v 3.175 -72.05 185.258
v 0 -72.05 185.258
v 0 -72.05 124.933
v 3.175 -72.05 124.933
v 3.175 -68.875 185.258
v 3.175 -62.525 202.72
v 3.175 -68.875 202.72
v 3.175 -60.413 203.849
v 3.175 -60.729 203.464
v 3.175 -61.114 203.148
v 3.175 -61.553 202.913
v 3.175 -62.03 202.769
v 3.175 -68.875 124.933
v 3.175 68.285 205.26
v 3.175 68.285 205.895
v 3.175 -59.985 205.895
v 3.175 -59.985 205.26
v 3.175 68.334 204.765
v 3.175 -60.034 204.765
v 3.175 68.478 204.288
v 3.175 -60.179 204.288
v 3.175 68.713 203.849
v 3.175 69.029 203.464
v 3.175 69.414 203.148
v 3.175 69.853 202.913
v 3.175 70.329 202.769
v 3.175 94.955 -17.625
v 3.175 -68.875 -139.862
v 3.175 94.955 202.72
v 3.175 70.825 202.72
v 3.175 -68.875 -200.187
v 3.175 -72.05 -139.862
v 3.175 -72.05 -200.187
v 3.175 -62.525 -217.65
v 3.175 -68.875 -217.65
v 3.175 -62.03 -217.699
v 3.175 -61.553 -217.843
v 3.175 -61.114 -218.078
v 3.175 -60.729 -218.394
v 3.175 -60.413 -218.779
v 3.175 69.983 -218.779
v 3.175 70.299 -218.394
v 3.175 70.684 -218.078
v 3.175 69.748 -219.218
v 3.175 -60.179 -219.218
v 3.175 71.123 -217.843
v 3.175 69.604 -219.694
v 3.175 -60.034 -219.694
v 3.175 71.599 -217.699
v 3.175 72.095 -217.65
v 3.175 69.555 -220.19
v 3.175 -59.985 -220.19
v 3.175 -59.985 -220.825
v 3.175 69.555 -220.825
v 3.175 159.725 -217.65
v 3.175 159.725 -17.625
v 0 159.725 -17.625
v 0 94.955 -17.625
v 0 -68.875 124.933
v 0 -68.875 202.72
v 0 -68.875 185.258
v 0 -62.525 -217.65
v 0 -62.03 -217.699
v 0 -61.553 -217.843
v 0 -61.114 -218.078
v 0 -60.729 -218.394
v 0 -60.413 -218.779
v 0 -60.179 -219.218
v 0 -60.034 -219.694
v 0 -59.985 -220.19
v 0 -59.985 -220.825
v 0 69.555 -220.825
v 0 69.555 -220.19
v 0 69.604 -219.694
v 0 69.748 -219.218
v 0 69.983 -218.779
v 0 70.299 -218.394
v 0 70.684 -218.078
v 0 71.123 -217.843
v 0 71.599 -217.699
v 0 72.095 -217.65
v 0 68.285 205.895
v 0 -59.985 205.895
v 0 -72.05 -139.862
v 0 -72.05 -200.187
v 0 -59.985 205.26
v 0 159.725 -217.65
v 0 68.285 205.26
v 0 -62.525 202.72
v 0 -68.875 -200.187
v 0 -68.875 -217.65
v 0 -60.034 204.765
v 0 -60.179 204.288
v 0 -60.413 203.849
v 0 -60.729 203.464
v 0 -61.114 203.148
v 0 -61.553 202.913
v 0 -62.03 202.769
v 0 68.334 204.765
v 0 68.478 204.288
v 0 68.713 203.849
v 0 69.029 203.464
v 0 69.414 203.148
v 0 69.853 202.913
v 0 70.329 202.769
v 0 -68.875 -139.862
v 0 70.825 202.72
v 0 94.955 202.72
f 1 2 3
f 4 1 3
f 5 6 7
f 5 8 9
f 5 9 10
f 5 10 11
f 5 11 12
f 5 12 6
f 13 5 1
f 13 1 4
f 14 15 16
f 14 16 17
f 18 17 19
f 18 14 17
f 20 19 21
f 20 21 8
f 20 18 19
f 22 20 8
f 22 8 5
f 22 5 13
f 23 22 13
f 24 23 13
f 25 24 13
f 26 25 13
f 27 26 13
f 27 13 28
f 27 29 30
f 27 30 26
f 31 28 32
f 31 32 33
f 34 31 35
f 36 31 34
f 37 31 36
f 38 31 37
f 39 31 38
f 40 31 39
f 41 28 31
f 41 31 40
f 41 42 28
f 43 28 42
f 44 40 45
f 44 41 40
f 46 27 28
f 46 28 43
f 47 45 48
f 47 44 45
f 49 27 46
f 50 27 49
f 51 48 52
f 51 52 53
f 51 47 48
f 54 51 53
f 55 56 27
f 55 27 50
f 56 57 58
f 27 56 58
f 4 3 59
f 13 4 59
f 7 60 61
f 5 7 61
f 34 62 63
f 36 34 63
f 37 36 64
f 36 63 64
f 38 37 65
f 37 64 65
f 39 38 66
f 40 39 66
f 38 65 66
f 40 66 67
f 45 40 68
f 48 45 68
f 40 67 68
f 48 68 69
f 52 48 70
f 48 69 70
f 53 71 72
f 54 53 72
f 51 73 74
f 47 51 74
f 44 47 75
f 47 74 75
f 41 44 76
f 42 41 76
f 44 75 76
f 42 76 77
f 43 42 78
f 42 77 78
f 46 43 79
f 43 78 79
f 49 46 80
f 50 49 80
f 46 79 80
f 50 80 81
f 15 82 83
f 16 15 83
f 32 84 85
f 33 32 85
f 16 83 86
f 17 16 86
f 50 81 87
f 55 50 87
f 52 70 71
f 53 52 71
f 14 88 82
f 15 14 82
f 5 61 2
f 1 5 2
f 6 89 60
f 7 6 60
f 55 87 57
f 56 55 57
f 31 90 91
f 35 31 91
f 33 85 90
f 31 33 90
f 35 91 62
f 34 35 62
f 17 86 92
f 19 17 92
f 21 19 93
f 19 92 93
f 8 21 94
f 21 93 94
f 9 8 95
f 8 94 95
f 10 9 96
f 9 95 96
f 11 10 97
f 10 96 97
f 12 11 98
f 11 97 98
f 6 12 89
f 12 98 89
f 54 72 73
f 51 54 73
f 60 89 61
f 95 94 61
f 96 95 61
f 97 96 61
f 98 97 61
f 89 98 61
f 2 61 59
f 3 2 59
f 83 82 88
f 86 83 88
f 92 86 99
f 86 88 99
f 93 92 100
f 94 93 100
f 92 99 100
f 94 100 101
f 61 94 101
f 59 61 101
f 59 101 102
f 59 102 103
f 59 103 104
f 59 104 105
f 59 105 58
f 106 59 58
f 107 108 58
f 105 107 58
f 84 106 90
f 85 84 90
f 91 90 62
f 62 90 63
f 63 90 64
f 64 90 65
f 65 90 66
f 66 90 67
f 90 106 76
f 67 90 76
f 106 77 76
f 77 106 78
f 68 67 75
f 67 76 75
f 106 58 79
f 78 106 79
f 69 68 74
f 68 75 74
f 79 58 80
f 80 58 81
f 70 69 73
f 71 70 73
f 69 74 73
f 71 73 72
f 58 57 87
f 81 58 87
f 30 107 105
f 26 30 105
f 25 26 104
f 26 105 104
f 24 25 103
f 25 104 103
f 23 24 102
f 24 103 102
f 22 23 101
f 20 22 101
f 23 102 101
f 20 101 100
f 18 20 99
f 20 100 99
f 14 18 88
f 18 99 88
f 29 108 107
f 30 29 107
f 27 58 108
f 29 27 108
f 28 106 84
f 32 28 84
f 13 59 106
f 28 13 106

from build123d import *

# Parameters (mm, degrees)
BOSS_EXTRUDE1_DEPTH     = 3.175
CUT_EXTRUDE1_DEPTH      = 273.554100881
CUT_EXTRUDE1_DEPTH_BACK = 273.554100881


with BuildPart() as part:
    # Sketch1 → Boss-Extrude1 (new body)
    with BuildSketch(Plane(origin=(0, 0, 0), x_dir=(0, 0, -1), z_dir=(1, 0, 0))):
        with BuildLine():
            Line((-202.720111625, -68.875155483), (-185.257611625, -68.875155483))
            Line((-185.257611625, -68.875155483), (-185.257611625, -72.050155483))
            Line((-185.257611625, -72.050155483), (-124.932611625, -72.050155483))
            Line((-124.932611625, -72.050155483), (-124.932611625, -68.875155483))
            Line((-124.932611625, -68.875155483), (124.932611625, -68.875155483))
            Line((124.932611625, -68.875155483), (139.862388375, -68.875155483))
            Line((139.862388375, -68.875155483), (139.862388375, -72.050155483))
            Line((139.862388375, -72.050155483), (200.187388375, -72.050155483))
            Line((200.187388375, -72.050155483), (200.187388375, -68.875155483))
            Line((200.187388375, -68.875155483), (220.824888375, -68.875155483))
            Line((220.824888375, -68.875155483), (220.824888375, 69.554844517))
            Line((220.824888375, 69.554844517), (220.189888375, 69.554844517))
            ThreePointArc((220.189888375, 69.554844517), (218.393837151, 70.298793293), (217.649888375, 72.094844517))
            Line((217.649888375, 72.094844517), (217.649888375, 159.724844517))
            Line((217.649888375, 159.724844517), (17.624888375, 159.724844517))
            Line((17.624888375, 159.724844517), (17.624888375, 94.954844517))
            Line((17.624888375, 94.954844517), (-202.720111625, 94.954844517))
            Line((-202.720111625, 94.954844517), (-202.720111625, 70.824844517))
            ThreePointArc((-202.720111625, 70.824844517), (-203.4640604, 69.028793293), (-205.260111625, 68.284844517))
            Line((-205.260111625, 68.284844517), (-205.895111625, 68.284844517))
            Line((-205.895111625, 68.284844517), (-205.895111625, -59.985155483))
            Line((-205.895111625, -59.985155483), (-205.260111625, -59.985155483))
            ThreePointArc((-205.260111625, -59.985155483), (-203.4640604, -60.729104259), (-202.720111625, -62.525155483))
            Line((-202.720111625, -62.525155483), (-202.720111625, -68.875155483))
        make_face()
    extrude(amount=BOSS_EXTRUDE1_DEPTH)

    # Sketch2 → Cut-Extrude1 (cut, two sides: drawn at the far end of the back side and taken through both)
    with BuildSketch(Plane(origin=(3.175, 0, 0), x_dir=(0, 0, -1), z_dir=(1, 0, 0)).offset(-CUT_EXTRUDE1_DEPTH_BACK)):
        with BuildLine():
            Line((220.824888375, -68.875155483), (217.649888375, -68.875155483))
            Line((217.649888375, -68.875155483), (217.649888375, -62.525155483))
            ThreePointArc((217.649888375, -62.525155483), (218.393837151, -60.729104259), (220.189888375, -59.985155483))
            Line((220.189888375, -59.985155483), (220.824888375, -59.985155483))
            Line((220.824888375, -59.985155483), (220.824888375, -68.875155483))
        make_face()
    extrude(amount=CUT_EXTRUDE1_DEPTH + CUT_EXTRUDE1_DEPTH_BACK, mode=Mode.SUBTRACT)


solid = part.part
